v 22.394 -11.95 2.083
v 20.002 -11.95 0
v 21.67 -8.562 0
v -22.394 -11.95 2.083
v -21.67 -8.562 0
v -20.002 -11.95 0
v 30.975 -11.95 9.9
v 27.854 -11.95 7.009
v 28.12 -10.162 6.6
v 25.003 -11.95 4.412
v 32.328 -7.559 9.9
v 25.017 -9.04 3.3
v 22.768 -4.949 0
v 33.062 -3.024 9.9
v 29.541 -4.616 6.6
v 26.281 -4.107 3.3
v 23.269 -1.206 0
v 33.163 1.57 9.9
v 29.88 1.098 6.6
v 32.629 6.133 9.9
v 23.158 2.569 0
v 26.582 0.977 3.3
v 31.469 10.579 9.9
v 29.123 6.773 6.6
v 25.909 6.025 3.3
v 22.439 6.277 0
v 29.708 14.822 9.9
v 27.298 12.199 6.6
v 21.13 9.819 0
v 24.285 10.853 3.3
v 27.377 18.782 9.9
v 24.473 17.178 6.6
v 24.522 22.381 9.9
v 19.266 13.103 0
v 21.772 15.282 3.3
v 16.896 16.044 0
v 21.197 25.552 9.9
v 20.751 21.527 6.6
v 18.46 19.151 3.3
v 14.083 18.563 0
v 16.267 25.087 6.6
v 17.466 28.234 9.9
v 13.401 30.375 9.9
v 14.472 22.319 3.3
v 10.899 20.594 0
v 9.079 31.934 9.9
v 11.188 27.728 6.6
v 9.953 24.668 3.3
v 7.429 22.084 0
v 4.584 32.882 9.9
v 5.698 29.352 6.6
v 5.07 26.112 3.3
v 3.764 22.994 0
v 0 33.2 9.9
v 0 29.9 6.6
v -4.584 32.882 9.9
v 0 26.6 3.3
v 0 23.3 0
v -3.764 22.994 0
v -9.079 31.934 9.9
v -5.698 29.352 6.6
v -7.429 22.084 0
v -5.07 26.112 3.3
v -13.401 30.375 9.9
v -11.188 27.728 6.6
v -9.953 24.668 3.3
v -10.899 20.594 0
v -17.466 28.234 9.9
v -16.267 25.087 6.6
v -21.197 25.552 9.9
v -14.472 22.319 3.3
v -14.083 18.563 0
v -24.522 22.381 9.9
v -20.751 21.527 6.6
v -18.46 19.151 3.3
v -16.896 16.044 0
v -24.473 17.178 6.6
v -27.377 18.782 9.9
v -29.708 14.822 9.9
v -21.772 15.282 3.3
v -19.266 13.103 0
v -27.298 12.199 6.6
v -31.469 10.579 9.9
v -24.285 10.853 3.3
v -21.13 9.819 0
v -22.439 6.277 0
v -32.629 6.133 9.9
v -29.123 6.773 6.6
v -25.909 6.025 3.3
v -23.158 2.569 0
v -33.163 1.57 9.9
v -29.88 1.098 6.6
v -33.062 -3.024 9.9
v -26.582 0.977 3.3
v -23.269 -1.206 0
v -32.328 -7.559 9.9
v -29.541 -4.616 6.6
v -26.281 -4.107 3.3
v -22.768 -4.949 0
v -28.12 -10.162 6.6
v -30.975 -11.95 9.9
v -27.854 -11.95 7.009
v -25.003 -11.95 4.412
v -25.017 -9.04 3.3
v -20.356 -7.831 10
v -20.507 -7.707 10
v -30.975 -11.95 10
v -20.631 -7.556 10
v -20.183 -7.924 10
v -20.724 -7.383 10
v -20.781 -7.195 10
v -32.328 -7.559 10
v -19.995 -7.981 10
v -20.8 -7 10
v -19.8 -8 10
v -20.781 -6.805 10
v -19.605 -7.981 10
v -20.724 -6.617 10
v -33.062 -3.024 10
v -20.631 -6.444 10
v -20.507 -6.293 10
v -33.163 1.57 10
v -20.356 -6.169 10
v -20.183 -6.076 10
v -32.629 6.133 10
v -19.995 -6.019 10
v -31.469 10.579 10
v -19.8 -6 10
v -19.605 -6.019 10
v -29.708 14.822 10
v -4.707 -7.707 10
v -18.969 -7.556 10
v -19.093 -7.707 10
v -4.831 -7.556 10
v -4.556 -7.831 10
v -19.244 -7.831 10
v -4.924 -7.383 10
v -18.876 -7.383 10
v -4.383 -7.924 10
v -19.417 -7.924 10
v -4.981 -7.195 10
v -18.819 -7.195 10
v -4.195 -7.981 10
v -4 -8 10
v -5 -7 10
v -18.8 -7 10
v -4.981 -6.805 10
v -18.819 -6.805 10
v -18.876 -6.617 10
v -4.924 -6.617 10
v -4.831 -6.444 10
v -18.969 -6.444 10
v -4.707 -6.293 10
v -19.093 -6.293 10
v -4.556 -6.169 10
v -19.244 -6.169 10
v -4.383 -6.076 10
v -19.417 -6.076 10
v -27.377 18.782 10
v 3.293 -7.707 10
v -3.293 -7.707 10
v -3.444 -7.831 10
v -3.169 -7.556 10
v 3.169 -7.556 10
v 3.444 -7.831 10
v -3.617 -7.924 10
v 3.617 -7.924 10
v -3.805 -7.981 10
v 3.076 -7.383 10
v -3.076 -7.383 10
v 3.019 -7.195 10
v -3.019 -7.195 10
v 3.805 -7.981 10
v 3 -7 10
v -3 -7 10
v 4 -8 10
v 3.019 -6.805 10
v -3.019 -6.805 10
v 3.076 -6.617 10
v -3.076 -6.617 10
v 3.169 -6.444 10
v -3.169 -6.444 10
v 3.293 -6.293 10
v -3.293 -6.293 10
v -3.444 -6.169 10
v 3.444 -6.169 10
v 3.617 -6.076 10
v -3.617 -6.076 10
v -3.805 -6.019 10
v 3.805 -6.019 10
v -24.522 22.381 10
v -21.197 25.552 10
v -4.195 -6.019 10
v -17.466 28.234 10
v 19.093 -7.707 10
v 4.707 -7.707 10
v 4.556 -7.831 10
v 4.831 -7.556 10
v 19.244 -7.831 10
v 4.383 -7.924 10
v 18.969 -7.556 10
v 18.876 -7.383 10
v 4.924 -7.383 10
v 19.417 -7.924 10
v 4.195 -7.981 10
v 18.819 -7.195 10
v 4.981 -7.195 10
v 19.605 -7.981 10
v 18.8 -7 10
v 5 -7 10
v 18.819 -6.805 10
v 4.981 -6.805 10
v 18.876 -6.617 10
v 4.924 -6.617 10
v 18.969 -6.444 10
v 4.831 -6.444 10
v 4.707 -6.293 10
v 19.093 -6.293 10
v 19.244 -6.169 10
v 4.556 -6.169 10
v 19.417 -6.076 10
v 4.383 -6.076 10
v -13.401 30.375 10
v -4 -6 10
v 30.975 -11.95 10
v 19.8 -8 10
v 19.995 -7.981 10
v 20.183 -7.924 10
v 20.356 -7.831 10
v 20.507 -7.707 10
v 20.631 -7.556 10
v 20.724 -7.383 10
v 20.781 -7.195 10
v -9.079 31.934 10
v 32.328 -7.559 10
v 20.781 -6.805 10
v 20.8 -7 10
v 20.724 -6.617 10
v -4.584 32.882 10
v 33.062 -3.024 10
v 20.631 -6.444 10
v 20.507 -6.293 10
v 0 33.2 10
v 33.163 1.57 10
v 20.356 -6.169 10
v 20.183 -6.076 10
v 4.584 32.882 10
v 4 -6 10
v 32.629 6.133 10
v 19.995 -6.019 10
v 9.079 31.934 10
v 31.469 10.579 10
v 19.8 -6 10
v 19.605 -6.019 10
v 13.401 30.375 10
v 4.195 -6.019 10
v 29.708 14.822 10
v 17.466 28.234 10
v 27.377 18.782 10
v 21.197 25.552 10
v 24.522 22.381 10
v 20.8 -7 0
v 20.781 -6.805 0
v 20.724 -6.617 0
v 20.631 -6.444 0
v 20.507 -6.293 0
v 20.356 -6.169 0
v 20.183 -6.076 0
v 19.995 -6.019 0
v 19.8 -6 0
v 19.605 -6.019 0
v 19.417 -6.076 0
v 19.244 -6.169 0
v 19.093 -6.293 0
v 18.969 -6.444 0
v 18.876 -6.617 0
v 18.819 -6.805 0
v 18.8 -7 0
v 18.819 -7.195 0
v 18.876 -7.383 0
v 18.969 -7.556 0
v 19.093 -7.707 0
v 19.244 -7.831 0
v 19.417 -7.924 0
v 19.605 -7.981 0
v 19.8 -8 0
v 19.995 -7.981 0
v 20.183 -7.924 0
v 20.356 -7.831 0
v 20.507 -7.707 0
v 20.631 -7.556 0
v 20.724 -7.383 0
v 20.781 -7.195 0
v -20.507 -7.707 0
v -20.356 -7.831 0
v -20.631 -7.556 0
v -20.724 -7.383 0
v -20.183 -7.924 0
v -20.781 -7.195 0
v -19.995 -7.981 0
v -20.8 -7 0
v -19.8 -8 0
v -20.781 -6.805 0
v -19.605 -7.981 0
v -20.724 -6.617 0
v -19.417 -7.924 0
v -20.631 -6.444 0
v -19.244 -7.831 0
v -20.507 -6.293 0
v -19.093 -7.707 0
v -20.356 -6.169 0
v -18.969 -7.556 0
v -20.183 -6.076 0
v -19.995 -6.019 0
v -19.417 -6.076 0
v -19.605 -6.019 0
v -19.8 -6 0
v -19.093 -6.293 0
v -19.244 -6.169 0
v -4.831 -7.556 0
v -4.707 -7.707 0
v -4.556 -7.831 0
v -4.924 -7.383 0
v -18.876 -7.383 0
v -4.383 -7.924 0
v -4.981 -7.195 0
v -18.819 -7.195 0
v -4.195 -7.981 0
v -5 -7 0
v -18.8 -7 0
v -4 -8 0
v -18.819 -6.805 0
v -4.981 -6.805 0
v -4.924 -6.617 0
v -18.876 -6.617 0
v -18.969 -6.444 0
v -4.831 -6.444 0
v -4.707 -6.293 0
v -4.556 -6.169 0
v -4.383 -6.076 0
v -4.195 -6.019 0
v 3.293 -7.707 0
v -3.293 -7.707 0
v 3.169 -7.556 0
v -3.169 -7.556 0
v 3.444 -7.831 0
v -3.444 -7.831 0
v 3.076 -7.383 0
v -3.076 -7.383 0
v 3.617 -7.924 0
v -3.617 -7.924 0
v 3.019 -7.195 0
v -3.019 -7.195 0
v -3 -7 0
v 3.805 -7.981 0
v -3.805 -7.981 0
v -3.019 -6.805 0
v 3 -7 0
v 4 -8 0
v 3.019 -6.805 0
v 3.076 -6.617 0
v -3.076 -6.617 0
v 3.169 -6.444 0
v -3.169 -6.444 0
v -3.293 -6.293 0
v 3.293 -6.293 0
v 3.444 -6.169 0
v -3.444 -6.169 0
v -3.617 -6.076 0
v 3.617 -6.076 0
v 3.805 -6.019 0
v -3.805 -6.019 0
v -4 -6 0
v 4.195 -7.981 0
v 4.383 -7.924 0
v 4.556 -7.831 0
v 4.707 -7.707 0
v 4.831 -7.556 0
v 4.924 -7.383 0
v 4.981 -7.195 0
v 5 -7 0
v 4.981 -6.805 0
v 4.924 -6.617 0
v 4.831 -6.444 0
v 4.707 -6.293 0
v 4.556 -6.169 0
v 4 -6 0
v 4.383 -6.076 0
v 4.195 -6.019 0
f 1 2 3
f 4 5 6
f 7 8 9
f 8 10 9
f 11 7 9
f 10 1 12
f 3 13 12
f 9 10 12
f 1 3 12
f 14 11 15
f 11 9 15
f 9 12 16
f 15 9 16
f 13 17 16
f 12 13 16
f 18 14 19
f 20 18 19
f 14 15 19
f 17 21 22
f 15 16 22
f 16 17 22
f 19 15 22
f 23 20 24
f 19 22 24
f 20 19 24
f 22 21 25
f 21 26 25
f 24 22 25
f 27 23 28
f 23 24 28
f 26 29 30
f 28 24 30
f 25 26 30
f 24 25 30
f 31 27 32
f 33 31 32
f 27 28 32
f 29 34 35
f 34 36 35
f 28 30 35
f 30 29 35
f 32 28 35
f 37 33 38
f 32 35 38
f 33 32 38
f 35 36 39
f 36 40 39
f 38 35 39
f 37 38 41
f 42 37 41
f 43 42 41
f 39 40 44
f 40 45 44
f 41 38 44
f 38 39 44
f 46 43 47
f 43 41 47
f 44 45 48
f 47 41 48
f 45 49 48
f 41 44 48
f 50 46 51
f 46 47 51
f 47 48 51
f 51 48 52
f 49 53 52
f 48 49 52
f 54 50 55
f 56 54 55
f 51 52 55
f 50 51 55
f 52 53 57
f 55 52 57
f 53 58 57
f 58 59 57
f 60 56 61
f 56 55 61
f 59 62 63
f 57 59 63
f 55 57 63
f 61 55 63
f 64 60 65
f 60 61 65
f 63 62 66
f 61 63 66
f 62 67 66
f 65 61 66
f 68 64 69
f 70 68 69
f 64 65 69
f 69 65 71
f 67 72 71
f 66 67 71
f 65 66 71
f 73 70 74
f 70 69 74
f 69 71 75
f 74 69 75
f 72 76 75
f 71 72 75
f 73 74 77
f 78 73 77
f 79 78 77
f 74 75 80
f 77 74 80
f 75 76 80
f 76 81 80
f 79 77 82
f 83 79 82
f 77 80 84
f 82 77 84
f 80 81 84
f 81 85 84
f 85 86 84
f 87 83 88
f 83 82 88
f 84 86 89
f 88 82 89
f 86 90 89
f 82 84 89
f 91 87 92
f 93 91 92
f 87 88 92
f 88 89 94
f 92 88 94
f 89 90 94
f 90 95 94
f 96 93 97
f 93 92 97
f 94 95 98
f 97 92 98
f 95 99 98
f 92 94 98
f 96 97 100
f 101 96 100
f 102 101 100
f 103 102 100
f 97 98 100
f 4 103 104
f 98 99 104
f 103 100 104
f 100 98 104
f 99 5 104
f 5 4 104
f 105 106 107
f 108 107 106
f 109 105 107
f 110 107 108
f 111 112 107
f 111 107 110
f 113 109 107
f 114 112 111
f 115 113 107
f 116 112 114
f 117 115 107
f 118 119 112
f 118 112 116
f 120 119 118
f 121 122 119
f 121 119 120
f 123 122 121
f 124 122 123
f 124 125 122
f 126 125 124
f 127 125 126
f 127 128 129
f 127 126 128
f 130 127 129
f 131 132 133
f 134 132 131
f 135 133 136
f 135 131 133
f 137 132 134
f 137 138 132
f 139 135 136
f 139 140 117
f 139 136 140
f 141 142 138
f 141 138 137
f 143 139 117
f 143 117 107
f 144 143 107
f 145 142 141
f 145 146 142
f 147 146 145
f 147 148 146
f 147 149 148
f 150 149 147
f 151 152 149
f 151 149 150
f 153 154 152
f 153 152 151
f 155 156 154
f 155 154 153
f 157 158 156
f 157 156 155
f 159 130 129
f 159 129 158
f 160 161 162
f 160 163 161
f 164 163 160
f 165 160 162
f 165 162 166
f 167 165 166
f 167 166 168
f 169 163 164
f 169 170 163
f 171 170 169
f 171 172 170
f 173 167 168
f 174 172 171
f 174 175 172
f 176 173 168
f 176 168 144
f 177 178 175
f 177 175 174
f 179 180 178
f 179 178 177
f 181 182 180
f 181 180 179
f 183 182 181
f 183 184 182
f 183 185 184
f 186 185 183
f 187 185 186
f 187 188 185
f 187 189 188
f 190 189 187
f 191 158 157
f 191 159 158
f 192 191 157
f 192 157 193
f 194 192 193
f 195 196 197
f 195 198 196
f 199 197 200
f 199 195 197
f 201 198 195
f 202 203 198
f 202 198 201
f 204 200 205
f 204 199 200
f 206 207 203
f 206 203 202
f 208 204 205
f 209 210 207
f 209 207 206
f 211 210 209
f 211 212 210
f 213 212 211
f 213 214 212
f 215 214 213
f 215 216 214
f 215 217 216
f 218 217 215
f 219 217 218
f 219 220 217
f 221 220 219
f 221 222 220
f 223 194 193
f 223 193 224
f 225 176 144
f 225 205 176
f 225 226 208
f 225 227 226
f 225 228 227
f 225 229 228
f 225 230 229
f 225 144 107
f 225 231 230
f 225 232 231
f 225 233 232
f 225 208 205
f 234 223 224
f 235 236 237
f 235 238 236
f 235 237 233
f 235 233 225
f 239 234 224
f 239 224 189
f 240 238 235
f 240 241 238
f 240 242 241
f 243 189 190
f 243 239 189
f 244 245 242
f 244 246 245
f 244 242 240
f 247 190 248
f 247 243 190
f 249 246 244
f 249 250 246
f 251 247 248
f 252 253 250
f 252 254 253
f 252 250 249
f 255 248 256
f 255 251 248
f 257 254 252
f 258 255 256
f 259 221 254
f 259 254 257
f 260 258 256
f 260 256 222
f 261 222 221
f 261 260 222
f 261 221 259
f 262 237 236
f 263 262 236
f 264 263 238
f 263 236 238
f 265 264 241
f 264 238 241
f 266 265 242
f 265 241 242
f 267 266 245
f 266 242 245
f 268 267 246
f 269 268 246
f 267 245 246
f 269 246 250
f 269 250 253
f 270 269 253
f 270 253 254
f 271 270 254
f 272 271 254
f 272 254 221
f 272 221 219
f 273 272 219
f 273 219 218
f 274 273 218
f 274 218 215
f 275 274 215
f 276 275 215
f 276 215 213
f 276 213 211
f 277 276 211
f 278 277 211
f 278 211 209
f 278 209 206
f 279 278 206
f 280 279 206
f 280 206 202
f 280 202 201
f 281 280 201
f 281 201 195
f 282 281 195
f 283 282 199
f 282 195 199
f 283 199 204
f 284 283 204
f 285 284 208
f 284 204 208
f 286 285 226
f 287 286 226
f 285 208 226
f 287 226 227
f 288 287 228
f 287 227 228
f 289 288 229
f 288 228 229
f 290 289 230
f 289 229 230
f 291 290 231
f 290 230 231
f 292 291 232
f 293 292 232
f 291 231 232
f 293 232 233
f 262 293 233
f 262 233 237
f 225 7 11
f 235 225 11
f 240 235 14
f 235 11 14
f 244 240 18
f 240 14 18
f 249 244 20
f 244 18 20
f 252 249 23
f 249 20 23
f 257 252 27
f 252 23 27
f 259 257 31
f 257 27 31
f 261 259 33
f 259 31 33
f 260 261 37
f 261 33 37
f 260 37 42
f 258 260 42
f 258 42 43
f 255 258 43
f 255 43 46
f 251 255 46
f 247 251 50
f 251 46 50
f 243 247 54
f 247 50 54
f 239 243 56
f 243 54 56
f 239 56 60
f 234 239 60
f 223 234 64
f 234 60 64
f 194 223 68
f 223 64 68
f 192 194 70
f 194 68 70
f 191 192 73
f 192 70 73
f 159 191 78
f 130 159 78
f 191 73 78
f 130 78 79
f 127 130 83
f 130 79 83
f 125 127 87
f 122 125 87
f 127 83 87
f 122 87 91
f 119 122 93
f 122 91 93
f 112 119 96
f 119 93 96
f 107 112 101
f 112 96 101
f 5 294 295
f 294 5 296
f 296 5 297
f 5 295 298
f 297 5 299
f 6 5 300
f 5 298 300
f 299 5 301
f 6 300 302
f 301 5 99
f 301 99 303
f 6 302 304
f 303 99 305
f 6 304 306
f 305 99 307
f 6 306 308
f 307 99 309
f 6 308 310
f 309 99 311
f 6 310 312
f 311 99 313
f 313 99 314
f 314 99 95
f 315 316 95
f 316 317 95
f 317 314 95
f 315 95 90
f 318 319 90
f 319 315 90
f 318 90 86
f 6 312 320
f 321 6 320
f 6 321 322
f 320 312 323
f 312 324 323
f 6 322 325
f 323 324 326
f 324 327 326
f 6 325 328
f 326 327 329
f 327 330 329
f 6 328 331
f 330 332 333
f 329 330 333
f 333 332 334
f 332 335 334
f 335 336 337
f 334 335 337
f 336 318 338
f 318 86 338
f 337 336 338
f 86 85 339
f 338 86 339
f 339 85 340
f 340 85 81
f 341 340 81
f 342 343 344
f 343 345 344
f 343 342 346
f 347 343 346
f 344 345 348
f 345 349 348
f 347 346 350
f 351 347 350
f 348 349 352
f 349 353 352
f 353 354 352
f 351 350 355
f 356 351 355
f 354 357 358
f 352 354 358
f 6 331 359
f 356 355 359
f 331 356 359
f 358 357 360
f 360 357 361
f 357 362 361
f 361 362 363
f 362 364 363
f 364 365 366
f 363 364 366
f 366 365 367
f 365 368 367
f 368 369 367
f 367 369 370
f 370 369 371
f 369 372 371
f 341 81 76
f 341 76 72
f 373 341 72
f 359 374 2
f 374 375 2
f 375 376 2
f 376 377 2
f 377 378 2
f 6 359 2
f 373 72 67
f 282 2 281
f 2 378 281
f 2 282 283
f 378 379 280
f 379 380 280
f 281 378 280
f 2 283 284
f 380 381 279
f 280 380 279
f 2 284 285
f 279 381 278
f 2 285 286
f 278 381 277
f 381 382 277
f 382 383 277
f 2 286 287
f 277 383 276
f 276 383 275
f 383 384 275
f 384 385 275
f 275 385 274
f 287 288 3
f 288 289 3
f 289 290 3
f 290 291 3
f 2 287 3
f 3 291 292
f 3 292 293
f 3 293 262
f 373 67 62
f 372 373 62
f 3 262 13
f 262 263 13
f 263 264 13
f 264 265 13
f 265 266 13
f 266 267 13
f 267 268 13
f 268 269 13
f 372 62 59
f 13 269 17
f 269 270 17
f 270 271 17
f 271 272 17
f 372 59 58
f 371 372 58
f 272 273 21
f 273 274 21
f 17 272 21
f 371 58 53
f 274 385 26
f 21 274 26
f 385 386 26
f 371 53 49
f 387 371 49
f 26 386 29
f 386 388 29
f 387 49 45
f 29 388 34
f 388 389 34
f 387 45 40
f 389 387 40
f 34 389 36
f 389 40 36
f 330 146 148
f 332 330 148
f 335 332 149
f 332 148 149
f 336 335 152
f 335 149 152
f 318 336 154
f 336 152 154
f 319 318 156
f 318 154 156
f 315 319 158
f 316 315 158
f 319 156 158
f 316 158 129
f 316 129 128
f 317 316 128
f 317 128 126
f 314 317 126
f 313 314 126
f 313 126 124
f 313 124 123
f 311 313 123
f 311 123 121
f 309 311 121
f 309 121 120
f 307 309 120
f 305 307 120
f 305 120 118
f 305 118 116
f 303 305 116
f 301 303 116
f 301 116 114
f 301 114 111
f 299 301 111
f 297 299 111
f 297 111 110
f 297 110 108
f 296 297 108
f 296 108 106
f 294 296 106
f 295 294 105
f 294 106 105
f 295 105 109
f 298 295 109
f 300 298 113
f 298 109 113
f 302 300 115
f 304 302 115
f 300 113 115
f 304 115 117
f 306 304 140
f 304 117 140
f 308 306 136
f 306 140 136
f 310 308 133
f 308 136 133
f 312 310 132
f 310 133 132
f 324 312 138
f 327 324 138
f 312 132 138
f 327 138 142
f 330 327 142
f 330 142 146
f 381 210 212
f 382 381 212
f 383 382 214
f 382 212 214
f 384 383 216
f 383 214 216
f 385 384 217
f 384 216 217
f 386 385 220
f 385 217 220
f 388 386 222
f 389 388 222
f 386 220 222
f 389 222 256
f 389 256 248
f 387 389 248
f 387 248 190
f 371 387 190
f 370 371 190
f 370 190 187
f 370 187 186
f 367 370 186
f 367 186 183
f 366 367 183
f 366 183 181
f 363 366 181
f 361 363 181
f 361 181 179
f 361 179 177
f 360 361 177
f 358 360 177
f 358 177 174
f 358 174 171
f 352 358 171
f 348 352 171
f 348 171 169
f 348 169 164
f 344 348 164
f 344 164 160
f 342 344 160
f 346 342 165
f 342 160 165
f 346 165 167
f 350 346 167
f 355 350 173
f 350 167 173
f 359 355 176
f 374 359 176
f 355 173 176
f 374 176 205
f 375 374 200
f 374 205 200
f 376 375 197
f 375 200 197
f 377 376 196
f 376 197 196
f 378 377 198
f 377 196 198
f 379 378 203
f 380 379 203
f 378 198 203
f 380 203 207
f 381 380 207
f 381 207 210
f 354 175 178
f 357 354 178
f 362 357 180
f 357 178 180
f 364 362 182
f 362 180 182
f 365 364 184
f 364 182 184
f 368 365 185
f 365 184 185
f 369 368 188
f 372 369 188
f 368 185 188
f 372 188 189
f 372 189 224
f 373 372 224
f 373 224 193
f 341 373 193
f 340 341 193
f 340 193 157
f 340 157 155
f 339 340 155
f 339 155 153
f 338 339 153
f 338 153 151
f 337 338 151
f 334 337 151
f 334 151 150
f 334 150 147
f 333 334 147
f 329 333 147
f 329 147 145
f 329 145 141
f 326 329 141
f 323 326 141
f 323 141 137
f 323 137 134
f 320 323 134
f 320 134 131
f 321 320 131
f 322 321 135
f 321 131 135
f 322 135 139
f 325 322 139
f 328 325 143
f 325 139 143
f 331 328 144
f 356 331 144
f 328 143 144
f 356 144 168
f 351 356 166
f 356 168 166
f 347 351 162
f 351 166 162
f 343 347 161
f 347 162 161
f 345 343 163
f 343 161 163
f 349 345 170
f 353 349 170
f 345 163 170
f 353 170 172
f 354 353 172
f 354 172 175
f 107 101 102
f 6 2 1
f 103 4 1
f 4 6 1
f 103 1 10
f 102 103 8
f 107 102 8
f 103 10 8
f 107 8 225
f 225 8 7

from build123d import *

# Parameters (mm, degrees)
PAD_DEPTH       = 10
SKETCH005_R     = 1
POCKET001_DEPTH = 10.001
CHAMFER_SIZE    = 9.9


with BuildPart() as part:
    # Sketch → Pad (new body)
    with BuildSketch(Plane.XY):
        with BuildLine():
            ThreePointArc((30.974788, -11.95), (0, 33.2), (-30.974788, -11.95))
            Line((-30.974788, -11.95), (30.974788, -11.95))
        make_face()
    extrude(amount=PAD_DEPTH)

    # Sketch005 (on Face4 of Pad) → Pocket001 (cut, through all)
    with BuildSketch(Plane.XY.offset(10)):
        with Locations((4, -7)):
            Circle(SKETCH005_R)
        with Locations((19.8, -7)):
            Circle(SKETCH005_R)
        with Locations((-4, -7)):
            Circle(SKETCH005_R)
        with Locations((-19.8, -7)):
            Circle(SKETCH005_R)
    extrude(amount=-POCKET001_DEPTH, mode=Mode.SUBTRACT)

    # Chamfer
    chamfer_edges = [part.edges().sort_by_distance(p)[0] for p in [
        (0, 33.2, 0),
    ]]
    chamfer(chamfer_edges, length=CHAMFER_SIZE)


solid = part.part
